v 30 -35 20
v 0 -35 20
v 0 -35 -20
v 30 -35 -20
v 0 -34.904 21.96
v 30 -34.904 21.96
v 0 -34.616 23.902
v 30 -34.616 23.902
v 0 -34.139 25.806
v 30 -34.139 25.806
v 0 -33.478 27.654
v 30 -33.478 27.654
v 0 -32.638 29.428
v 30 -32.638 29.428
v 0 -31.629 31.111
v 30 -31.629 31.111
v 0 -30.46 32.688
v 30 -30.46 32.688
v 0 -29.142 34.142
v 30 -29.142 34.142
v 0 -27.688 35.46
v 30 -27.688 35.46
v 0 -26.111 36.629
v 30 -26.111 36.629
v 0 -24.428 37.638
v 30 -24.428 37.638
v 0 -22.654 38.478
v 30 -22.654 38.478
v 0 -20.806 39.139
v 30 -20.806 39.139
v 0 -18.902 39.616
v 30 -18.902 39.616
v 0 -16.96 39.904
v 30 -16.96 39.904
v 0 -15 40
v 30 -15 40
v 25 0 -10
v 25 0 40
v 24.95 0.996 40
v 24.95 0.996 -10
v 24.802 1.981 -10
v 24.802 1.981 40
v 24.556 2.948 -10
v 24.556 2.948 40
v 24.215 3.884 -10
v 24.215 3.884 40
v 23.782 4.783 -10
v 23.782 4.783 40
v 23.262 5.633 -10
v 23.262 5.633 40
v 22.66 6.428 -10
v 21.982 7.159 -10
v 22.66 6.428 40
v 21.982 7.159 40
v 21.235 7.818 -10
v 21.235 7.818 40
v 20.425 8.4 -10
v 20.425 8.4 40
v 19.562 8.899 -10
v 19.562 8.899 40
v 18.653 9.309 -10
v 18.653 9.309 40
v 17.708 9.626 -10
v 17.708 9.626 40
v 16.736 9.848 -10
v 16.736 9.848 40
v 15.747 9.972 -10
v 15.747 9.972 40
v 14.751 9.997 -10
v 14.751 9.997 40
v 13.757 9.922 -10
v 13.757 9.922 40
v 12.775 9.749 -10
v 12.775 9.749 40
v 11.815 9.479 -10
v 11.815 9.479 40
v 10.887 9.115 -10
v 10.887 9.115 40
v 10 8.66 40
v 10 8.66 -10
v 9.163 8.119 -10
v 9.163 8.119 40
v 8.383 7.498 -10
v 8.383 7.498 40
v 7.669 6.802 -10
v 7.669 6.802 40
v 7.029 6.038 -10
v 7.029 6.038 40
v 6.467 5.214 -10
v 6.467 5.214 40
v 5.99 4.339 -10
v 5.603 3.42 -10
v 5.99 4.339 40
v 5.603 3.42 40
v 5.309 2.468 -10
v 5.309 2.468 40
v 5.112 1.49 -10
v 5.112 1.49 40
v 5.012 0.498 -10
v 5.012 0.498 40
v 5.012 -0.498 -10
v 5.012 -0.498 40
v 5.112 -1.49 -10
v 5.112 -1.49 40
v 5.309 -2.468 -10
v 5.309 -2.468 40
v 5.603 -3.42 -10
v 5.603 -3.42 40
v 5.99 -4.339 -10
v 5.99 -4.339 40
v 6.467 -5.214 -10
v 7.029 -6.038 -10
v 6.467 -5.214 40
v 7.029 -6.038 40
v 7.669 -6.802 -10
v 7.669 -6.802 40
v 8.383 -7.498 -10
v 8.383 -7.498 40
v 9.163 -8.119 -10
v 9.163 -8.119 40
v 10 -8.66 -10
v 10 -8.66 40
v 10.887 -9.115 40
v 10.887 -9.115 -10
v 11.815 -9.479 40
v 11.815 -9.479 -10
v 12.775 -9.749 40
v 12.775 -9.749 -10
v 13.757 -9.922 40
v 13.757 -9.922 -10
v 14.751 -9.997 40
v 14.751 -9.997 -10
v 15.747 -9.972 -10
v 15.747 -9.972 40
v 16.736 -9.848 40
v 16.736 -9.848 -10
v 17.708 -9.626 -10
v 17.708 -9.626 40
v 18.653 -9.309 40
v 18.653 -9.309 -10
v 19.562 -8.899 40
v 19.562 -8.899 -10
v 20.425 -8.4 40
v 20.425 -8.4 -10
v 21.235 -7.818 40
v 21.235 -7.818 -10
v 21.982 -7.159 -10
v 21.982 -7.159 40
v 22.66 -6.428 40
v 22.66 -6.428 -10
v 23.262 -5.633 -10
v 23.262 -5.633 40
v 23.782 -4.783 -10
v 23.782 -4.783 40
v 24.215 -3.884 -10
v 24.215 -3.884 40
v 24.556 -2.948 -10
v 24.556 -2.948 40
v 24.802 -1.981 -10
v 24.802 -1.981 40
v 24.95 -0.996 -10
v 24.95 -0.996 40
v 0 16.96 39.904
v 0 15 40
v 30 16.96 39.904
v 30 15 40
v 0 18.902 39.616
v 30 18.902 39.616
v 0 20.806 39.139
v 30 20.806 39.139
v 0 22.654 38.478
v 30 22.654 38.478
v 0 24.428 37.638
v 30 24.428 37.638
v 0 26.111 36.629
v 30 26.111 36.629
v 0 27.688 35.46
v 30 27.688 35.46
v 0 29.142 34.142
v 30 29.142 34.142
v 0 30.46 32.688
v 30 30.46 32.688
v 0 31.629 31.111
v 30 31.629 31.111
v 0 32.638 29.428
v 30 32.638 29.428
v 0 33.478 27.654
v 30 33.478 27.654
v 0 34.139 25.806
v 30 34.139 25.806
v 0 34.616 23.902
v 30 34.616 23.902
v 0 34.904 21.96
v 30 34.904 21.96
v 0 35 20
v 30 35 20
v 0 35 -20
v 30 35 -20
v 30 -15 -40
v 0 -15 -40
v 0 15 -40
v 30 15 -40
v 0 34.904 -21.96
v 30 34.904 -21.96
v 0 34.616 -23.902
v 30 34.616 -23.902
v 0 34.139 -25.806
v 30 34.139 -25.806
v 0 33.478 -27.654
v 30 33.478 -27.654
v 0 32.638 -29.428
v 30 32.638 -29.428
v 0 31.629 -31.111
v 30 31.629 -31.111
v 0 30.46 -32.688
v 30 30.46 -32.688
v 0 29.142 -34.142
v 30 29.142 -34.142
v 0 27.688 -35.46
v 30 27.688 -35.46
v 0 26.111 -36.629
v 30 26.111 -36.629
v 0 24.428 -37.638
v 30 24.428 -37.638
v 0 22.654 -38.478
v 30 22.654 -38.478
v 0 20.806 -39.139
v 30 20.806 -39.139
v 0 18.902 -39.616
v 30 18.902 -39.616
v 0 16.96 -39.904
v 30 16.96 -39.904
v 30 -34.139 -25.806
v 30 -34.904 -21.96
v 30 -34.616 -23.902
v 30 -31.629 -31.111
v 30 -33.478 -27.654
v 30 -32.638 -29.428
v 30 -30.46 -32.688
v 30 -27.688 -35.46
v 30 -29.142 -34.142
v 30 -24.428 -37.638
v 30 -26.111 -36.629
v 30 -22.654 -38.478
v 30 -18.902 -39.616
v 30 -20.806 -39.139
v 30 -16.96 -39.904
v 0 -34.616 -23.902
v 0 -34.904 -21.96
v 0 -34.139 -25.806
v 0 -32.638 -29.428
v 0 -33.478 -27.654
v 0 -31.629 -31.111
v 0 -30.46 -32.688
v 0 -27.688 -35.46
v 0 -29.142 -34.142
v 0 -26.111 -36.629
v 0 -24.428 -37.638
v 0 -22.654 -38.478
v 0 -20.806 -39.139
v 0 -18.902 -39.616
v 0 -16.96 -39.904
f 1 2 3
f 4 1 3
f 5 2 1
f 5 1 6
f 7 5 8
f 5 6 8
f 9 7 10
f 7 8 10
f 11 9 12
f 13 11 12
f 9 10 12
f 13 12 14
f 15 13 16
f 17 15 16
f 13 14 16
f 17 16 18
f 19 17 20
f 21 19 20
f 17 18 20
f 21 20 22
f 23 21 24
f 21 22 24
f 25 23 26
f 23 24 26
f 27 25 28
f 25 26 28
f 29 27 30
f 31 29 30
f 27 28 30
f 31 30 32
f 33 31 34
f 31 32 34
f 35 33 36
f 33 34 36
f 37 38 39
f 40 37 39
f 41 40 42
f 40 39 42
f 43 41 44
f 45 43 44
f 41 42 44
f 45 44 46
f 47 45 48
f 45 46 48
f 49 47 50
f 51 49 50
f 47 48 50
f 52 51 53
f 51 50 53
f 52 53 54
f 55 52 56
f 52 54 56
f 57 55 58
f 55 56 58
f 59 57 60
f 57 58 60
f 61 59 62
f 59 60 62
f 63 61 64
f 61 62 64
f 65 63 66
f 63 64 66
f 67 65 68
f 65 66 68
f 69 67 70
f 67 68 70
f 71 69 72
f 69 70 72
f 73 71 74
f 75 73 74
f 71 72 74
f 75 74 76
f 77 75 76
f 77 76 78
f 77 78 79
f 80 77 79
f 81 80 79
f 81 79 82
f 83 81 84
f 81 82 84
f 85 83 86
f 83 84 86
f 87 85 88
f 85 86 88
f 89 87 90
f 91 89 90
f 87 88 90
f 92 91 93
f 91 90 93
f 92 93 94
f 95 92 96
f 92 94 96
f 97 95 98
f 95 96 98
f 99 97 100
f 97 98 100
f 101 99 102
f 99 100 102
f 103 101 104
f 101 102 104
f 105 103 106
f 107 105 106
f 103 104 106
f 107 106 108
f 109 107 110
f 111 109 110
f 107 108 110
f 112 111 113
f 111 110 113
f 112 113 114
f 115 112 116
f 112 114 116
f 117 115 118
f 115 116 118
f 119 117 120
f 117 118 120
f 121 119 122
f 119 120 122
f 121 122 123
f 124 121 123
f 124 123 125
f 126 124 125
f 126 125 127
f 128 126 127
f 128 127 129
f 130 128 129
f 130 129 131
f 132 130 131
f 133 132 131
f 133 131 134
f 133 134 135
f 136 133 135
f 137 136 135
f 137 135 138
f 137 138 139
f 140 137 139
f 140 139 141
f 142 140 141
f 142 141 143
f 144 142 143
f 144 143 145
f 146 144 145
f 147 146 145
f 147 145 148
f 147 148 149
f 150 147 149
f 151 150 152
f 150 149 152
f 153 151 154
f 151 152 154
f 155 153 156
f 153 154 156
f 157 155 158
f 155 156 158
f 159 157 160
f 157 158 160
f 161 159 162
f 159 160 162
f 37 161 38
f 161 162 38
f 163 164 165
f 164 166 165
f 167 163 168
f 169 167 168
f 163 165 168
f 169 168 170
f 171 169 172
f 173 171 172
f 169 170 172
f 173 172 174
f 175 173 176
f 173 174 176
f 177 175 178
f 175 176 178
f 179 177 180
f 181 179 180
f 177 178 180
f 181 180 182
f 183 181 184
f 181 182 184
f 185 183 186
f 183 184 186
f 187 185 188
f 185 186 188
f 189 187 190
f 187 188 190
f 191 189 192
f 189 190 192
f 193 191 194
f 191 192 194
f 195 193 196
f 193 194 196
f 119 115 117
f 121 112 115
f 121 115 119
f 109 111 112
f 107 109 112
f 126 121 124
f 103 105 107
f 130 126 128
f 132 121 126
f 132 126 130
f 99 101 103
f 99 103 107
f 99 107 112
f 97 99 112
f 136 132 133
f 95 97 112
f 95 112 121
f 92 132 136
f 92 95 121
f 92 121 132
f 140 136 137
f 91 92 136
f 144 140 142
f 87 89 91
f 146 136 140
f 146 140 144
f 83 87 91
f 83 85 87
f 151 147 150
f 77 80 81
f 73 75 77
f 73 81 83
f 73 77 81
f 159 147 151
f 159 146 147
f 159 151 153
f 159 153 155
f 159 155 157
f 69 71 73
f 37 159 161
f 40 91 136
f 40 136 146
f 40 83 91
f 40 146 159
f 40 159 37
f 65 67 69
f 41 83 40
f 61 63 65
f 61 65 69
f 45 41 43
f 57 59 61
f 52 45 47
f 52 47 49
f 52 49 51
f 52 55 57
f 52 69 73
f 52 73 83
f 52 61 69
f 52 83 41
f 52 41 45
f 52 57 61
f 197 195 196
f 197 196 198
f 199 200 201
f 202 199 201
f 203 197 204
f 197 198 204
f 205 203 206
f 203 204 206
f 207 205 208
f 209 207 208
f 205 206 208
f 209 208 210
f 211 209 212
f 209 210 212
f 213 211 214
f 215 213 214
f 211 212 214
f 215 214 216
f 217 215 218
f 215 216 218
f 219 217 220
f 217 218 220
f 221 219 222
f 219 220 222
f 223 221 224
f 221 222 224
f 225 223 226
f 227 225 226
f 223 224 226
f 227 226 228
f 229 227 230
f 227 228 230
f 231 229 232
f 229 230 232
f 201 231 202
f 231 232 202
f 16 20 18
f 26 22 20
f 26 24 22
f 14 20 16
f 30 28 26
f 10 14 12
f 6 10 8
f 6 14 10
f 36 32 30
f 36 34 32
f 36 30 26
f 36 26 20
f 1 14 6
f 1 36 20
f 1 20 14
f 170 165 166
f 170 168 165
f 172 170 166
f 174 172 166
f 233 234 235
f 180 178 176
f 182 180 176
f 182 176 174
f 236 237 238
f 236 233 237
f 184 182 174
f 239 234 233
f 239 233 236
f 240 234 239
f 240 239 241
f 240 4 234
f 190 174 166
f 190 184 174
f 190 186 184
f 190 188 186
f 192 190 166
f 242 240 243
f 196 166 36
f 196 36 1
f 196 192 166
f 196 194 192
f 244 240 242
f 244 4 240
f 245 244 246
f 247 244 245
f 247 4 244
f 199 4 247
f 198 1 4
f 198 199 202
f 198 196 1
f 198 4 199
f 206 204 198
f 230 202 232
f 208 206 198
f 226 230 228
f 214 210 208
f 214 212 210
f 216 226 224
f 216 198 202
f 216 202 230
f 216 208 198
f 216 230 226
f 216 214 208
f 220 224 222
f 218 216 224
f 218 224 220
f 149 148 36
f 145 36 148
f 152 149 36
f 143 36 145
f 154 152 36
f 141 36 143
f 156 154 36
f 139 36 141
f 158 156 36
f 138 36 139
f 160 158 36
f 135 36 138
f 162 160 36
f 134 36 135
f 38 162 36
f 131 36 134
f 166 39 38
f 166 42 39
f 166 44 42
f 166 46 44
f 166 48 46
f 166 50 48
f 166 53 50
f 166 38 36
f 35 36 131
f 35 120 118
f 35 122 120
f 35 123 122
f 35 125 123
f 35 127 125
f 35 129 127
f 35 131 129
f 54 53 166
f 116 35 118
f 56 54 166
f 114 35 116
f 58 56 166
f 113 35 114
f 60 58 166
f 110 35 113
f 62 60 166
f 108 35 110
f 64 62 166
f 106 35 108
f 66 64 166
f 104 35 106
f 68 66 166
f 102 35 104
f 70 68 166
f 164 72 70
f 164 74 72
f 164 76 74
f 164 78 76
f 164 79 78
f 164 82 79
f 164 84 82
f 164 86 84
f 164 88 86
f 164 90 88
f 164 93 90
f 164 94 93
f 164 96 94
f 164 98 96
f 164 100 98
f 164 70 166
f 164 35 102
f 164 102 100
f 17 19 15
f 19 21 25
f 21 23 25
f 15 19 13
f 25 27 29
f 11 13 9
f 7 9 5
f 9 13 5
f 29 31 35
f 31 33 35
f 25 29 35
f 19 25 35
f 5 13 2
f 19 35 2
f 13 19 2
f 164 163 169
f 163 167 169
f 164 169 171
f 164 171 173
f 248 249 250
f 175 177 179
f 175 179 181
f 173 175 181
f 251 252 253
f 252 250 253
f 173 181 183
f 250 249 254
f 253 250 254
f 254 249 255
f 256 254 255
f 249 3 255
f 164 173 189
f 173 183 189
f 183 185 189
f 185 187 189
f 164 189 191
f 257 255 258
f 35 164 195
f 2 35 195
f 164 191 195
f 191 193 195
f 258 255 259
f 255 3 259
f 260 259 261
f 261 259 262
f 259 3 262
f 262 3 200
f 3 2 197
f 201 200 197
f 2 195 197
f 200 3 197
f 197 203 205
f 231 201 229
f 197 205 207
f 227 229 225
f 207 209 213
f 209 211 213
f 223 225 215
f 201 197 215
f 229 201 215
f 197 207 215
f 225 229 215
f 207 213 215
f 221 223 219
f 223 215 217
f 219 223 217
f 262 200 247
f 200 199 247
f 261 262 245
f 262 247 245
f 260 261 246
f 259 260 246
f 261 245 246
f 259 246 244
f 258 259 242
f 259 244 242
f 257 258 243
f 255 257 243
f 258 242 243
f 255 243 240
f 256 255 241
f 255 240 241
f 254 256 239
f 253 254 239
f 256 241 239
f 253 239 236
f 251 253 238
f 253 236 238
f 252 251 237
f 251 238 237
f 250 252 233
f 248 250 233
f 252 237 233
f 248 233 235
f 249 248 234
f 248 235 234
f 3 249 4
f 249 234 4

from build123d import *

# Parameters (mm, degrees)
SKETCH1_W           = 80
SKETCH1_H           = 70
BOSS_EXTRUDE1_DEPTH = 30
SKETCH2_R           = 10
CUT_EXTRUDE1_DEPTH  = 50
FILLET1_R           = 20
FILLET2_R           = 20
FILLET3_R           = 20
FILLET4_R           = 20


with BuildPart() as part:
    # Sketch1 → Boss-Extrude1 (new body)
    with BuildSketch(Plane(origin=(0, 0, 0), x_dir=(0, 0, -1), z_dir=(1, 0, 0))):
        Rectangle(SKETCH1_W, SKETCH1_H)
    extrude(amount=BOSS_EXTRUDE1_DEPTH)

    # Sketch2 → Cut-Extrude1 (cut)
    with BuildSketch(Plane.XY.offset(40)):
        with Locations((15, 0)):
            Circle(SKETCH2_R)
    extrude(amount=-CUT_EXTRUDE1_DEPTH, mode=Mode.SUBTRACT)

    # Fillet1
    fillet1_edges = [part.edges().sort_by_distance(p)[0] for p in [
        (15, 35, -40),
    ]]
    fillet(fillet1_edges, radius=FILLET1_R)

    # Fillet2
    fillet2_edges = [part.edges().sort_by_distance(p)[0] for p in [
        (15, -35, -40),
    ]]
    fillet(fillet2_edges, radius=FILLET2_R)

    # Fillet3
    fillet3_edges = [part.edges().sort_by_distance(p)[0] for p in [
        (15, -35, 40),
    ]]
    fillet(fillet3_edges, radius=FILLET3_R)

    # Fillet4
    fillet4_edges = [part.edges().sort_by_distance(p)[0] for p in [
        (15, 35, 40),
    ]]
    fillet(fillet4_edges, radius=FILLET4_R)


solid = part.part
